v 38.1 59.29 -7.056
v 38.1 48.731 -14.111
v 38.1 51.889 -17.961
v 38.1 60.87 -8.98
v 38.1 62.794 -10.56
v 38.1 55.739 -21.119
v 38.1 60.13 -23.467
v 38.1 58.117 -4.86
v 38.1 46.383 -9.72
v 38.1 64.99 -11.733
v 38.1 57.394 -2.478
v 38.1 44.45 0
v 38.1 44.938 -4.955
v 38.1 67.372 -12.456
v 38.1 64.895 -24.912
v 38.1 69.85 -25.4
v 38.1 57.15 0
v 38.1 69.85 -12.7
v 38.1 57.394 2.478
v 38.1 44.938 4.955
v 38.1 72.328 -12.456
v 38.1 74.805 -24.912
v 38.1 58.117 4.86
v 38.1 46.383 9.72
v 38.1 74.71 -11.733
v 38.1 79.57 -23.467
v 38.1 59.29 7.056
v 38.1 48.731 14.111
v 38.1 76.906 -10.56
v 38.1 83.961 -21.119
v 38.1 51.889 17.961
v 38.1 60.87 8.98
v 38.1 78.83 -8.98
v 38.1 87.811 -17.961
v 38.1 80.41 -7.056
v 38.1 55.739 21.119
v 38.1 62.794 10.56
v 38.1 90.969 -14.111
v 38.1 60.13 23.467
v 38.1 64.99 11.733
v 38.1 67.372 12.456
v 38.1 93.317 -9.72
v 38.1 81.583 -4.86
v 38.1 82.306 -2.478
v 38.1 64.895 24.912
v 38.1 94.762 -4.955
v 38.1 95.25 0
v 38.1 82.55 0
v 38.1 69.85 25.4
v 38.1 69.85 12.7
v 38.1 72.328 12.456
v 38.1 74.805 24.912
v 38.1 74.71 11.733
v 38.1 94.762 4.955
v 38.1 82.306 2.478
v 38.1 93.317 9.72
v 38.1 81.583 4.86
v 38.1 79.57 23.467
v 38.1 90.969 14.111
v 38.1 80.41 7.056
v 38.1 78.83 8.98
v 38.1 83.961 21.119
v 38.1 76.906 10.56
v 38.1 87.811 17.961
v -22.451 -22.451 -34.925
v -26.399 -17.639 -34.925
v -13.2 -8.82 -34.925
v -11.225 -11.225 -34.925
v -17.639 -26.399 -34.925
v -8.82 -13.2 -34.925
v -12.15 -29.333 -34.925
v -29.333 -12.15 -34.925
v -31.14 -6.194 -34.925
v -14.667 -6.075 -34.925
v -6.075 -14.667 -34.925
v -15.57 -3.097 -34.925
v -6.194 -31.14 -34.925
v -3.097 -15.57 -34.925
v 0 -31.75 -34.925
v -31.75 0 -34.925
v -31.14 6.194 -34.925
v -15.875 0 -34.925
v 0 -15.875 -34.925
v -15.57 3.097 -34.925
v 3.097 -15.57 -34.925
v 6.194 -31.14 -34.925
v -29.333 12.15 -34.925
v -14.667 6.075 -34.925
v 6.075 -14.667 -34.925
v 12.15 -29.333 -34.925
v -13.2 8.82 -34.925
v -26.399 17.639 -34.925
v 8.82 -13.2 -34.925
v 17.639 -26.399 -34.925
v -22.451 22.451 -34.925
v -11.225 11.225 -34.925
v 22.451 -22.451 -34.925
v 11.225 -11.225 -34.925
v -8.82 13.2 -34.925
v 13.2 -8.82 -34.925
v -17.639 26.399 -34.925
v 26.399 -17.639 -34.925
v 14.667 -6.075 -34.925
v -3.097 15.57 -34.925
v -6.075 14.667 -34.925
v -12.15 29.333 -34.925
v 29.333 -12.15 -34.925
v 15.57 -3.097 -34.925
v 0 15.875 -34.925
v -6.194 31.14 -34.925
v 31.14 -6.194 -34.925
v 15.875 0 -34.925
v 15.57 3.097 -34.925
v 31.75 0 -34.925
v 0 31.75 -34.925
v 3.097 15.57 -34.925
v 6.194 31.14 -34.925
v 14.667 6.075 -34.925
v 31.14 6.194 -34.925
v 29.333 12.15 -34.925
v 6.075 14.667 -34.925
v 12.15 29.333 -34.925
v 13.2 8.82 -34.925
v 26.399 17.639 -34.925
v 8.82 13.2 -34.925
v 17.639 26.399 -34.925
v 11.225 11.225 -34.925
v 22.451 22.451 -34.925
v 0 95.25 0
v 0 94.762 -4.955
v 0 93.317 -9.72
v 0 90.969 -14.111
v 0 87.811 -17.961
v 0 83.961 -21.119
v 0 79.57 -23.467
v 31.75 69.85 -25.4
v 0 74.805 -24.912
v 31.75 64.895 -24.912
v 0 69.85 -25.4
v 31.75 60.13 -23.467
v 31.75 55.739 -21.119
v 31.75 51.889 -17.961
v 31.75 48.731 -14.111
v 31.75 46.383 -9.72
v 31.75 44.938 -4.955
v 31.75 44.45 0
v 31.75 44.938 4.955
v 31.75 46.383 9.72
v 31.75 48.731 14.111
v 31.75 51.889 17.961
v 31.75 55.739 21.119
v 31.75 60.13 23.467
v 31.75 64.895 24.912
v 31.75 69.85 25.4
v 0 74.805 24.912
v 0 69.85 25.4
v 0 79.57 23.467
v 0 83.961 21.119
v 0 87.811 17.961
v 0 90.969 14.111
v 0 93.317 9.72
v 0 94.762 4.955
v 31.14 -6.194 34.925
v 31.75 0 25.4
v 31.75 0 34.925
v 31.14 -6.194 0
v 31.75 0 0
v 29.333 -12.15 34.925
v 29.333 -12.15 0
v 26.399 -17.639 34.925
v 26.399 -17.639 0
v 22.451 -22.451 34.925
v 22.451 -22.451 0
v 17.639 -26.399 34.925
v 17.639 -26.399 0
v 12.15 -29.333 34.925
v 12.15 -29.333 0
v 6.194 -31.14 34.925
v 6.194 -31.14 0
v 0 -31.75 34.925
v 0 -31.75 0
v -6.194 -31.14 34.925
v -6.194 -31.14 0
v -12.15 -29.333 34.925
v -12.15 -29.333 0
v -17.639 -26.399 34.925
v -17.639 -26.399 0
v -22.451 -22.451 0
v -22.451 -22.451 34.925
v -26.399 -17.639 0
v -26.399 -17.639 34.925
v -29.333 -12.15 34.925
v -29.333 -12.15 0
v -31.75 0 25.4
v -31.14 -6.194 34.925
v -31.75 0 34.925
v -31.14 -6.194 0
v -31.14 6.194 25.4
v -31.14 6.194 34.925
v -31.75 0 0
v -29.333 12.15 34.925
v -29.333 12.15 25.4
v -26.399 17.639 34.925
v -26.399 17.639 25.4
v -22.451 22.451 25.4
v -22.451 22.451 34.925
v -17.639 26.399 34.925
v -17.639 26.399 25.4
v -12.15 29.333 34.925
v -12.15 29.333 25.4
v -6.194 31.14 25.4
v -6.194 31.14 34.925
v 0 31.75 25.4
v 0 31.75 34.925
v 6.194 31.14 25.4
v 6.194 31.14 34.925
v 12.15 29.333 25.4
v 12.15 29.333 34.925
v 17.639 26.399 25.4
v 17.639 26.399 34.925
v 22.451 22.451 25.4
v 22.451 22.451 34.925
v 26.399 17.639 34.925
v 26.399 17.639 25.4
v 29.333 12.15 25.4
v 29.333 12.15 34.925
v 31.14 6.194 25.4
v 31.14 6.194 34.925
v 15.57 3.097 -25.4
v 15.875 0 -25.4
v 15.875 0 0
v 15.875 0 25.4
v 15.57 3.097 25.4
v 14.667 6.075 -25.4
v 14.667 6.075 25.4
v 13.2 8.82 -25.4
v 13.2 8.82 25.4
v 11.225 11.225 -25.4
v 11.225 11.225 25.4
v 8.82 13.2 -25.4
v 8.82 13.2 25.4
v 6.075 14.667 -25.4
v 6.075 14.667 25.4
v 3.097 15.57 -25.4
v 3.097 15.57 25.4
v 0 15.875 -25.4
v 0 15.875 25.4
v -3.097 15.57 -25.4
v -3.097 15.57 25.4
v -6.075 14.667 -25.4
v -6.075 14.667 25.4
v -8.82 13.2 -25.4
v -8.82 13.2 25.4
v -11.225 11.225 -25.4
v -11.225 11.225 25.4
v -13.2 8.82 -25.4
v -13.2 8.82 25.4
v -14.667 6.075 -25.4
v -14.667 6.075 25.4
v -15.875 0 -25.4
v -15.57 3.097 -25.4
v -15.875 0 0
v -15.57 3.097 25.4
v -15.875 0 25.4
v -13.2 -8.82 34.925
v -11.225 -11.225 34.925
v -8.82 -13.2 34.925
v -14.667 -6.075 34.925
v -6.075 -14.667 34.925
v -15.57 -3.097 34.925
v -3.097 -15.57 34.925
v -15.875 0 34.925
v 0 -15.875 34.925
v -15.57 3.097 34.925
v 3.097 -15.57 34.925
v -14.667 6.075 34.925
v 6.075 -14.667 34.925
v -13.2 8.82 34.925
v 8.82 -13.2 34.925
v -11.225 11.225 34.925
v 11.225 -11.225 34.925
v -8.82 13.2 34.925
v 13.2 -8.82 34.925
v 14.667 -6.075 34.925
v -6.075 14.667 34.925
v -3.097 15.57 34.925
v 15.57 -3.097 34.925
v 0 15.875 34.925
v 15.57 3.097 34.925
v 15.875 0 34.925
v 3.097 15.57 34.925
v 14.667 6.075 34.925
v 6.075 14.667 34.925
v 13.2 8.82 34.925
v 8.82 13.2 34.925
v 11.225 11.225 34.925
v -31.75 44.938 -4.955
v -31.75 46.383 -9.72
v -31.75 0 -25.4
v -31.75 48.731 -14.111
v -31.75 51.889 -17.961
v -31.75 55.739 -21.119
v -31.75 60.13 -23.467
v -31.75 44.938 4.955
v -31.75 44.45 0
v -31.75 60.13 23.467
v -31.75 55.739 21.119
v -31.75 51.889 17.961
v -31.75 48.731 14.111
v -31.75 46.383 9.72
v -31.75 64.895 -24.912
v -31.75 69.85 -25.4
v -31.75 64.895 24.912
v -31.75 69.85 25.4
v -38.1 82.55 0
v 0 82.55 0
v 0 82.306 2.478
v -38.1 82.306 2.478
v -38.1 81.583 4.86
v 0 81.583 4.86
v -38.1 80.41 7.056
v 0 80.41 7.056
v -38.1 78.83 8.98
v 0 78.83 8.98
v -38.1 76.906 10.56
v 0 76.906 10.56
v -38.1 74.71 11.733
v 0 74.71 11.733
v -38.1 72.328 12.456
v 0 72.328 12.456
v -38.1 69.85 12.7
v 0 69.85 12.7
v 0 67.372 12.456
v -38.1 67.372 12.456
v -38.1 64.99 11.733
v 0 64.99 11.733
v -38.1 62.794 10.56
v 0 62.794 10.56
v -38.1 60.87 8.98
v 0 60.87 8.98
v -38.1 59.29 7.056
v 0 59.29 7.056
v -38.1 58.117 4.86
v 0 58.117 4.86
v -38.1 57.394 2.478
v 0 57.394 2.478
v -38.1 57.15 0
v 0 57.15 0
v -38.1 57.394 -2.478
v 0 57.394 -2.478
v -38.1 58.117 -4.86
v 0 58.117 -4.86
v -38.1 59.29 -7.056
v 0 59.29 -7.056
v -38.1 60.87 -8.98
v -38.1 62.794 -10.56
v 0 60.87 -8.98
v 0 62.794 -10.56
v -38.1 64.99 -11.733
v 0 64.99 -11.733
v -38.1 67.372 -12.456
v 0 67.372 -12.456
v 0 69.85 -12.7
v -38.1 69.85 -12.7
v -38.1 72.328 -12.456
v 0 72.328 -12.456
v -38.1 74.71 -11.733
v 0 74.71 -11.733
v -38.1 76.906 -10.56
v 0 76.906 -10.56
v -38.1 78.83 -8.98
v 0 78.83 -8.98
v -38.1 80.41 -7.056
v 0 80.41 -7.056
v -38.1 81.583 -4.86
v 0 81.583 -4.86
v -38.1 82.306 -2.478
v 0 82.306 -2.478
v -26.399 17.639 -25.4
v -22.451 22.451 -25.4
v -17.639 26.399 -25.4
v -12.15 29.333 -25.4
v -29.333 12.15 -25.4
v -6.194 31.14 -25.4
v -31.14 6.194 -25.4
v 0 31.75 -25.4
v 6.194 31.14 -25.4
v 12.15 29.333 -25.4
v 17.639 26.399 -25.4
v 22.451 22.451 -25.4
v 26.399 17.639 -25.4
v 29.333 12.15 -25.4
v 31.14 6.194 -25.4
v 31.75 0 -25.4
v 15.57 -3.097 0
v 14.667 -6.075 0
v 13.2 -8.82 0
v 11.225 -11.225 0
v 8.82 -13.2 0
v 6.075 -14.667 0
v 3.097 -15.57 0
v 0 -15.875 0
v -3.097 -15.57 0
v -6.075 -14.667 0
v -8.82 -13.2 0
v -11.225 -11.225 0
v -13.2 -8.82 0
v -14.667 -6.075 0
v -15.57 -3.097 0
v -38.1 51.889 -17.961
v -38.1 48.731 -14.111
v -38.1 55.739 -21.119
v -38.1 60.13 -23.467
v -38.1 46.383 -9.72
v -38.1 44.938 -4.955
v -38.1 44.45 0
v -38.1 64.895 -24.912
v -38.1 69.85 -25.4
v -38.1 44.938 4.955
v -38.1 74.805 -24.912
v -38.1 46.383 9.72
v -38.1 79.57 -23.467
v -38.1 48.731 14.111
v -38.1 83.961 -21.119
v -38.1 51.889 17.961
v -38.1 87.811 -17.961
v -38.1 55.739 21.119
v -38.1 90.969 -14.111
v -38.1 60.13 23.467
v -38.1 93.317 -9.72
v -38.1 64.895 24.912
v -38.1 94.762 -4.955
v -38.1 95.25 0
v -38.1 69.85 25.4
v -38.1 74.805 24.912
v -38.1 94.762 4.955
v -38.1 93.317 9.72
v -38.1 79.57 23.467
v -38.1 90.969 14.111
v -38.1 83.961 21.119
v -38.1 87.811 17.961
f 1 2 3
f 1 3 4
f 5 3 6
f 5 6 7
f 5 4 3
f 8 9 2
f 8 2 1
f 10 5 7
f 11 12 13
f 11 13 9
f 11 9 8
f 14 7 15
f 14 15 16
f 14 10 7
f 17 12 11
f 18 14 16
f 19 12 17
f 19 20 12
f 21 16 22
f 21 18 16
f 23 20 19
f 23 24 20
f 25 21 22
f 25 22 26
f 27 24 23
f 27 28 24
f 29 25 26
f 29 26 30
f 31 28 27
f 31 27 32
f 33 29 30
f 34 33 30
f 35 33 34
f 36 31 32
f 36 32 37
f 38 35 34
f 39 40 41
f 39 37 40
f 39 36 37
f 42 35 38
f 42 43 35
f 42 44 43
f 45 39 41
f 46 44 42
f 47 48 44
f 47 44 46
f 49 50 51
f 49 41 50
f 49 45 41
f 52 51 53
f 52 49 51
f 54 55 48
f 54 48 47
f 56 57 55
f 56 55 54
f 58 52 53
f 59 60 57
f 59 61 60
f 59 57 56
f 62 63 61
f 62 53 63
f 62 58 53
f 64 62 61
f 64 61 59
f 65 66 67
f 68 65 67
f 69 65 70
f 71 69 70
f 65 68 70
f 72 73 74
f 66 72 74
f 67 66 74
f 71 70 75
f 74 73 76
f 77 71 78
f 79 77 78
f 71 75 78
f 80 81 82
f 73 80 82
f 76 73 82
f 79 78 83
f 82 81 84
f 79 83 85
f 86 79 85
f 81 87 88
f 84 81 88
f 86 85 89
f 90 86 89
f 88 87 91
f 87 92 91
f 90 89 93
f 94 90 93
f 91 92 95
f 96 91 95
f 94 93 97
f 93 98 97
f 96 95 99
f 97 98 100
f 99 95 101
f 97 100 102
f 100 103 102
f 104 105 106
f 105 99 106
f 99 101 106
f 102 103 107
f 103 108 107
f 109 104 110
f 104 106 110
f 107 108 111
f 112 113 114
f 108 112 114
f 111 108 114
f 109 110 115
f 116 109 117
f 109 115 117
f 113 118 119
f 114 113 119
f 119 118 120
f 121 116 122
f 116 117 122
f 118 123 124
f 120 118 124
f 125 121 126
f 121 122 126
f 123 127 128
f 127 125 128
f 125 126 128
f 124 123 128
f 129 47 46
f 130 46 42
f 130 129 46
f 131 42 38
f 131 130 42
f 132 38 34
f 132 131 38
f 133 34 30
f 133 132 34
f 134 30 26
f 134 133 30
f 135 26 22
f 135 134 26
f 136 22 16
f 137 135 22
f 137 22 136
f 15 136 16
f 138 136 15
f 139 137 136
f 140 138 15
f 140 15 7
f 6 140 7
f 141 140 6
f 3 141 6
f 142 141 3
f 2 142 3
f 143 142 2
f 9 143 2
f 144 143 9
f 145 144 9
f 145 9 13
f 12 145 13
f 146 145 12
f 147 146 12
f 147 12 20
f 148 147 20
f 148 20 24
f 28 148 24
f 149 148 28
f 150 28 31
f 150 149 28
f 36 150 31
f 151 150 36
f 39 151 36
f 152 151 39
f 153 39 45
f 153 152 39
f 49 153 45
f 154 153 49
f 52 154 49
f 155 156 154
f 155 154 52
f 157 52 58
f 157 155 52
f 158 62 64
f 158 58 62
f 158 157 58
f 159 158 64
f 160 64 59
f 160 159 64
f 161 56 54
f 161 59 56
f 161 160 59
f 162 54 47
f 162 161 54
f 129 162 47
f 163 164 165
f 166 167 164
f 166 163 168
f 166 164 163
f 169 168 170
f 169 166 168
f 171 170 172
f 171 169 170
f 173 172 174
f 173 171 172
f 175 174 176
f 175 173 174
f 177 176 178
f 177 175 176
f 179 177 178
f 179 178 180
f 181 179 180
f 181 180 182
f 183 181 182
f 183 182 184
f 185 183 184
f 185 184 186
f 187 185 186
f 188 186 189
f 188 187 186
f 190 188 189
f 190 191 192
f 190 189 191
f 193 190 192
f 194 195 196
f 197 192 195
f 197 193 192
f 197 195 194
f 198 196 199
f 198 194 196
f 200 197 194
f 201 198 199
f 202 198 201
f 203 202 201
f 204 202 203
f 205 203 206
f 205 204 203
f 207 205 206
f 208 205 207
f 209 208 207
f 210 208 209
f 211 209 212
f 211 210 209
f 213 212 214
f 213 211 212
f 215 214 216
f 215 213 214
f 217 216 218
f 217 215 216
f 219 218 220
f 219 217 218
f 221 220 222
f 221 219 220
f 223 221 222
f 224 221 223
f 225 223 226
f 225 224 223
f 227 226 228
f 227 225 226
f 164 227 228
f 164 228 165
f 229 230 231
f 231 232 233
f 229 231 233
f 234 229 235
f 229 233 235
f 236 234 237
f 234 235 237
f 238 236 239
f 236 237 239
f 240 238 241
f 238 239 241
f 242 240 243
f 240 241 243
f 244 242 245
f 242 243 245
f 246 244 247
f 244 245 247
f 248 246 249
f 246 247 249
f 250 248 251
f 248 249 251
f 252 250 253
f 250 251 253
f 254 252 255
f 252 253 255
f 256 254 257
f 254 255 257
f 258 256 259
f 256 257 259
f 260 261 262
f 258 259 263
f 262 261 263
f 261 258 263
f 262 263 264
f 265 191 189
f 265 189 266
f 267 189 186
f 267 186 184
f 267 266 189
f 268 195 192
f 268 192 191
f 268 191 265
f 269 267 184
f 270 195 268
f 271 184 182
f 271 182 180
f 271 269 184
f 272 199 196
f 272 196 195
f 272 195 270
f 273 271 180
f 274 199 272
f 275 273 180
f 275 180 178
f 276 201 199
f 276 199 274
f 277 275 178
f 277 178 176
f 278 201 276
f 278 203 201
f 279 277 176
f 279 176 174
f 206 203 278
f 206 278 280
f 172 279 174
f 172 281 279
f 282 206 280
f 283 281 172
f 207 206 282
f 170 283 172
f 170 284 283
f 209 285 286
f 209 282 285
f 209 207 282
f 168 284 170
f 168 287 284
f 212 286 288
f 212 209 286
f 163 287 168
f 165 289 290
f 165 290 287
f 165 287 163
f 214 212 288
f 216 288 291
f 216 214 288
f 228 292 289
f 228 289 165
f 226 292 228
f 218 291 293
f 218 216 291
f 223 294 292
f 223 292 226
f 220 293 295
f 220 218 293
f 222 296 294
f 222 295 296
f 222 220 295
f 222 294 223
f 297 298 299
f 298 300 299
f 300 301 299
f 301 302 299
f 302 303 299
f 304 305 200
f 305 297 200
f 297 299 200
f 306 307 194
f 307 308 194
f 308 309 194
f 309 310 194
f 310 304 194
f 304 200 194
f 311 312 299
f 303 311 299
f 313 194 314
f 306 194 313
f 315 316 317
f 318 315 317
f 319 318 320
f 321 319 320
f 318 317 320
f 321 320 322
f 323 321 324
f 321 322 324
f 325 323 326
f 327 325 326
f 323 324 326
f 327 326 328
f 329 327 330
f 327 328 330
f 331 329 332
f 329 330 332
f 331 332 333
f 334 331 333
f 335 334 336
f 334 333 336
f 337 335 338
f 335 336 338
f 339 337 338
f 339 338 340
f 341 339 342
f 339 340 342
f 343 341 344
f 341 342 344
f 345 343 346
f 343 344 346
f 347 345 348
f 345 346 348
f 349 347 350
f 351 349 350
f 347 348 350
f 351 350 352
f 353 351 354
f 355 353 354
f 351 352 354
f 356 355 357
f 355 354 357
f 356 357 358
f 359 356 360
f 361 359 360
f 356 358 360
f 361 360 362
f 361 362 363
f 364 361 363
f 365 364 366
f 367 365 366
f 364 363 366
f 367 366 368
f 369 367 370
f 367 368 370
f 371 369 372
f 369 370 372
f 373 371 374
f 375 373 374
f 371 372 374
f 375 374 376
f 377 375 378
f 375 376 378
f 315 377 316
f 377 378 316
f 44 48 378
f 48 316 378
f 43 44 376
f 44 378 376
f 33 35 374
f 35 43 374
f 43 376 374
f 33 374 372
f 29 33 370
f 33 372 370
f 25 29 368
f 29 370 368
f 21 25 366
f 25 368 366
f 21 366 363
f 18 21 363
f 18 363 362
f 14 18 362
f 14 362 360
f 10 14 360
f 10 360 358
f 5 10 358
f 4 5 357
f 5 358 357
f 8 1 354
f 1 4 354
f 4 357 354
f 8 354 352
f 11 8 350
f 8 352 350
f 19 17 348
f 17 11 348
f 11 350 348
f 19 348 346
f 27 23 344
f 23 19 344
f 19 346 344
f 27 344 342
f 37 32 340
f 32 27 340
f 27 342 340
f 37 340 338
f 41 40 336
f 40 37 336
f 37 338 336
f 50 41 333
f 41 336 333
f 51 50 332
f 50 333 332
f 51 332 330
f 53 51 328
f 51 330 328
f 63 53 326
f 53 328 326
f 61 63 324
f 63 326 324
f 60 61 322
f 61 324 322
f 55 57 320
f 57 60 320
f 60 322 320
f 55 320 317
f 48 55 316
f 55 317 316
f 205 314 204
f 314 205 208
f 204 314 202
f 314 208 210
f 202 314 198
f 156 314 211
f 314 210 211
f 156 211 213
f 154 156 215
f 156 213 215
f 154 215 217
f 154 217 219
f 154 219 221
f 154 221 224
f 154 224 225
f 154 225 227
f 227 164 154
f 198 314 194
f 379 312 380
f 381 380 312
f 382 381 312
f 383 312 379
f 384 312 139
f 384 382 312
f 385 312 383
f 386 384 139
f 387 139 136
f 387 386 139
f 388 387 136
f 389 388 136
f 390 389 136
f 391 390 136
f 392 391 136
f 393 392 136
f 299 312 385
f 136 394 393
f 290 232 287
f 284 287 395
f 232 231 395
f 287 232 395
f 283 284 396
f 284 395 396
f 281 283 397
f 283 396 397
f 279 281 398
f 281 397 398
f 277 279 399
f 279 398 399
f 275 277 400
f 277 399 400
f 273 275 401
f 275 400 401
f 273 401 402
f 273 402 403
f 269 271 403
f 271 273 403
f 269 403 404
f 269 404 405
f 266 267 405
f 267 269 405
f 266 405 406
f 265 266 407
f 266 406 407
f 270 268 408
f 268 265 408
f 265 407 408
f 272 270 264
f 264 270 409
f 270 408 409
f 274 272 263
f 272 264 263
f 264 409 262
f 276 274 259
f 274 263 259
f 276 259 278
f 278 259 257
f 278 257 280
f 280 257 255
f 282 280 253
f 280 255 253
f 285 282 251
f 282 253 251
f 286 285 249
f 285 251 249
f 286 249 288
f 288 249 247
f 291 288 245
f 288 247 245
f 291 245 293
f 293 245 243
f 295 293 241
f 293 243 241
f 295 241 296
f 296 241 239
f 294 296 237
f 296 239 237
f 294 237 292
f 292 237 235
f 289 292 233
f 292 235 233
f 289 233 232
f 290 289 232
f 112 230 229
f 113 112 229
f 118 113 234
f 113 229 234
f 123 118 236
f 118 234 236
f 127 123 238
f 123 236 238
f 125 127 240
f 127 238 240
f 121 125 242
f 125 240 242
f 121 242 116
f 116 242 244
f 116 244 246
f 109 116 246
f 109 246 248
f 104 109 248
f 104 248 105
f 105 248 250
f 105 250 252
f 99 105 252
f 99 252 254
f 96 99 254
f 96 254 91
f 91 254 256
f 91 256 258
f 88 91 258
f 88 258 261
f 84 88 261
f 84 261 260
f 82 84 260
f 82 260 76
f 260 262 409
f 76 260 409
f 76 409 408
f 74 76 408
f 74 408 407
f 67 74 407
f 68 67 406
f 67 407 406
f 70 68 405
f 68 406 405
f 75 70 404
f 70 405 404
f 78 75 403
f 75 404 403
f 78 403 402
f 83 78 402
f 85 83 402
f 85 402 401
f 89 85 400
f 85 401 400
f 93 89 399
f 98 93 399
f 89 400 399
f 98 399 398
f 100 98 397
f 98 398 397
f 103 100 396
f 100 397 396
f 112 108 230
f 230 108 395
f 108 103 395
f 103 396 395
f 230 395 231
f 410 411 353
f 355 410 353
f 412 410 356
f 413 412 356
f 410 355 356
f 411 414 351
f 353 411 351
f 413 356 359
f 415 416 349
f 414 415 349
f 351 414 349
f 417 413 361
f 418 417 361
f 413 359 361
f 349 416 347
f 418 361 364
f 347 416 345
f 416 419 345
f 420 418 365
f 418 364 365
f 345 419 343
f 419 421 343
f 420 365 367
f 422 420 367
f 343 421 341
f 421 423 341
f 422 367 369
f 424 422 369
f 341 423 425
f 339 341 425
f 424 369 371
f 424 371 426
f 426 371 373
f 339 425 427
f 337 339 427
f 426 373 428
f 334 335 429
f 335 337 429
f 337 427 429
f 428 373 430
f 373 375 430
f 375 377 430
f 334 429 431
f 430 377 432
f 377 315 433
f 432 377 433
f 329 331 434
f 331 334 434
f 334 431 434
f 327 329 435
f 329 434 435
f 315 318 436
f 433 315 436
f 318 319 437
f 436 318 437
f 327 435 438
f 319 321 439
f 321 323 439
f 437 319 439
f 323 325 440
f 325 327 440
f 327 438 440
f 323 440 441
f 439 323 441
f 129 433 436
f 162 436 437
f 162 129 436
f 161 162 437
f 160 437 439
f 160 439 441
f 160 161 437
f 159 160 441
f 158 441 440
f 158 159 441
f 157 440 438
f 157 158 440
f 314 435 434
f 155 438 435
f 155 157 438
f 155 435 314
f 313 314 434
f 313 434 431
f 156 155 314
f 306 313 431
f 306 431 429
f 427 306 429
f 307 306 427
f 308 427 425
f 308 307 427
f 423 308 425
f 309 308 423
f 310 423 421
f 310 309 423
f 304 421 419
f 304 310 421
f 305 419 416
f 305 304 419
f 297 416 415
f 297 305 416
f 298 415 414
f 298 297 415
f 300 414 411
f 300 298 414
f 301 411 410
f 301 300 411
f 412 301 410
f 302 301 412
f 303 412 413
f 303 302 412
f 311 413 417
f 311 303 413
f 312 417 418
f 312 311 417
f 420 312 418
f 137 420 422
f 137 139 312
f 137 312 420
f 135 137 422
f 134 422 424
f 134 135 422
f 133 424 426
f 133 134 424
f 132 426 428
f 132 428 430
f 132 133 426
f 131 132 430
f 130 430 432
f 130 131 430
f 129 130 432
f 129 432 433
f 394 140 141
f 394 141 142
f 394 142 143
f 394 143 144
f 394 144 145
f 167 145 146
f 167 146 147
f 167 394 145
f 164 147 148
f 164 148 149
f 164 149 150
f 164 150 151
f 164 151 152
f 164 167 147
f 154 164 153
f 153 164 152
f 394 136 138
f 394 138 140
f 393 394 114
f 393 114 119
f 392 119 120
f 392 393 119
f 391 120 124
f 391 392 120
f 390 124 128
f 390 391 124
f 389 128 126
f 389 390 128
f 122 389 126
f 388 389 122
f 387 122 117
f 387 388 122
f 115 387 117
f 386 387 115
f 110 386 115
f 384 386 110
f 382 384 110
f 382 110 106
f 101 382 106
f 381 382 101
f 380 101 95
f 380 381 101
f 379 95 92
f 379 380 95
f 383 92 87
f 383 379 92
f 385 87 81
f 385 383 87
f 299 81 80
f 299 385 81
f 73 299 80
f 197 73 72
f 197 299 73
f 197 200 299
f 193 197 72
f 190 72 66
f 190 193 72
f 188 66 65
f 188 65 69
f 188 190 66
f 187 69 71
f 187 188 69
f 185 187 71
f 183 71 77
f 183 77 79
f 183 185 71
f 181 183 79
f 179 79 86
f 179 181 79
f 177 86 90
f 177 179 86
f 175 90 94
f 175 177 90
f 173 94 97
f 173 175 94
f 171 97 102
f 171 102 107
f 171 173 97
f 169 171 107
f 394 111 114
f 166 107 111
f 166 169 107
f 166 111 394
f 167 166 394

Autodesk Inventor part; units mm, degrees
ref_plane "YZ Plane" through (0, 0, 0) normal (1, 0, 0) x (0, 1, 0)
ref_plane "XZ Plane" through (0, 0, 0) normal (0, 1, 0) x (-1, 0, 0)
ref_plane "XY Plane" through (0, 0, 0) normal (0, 0, 1) x (1, 0, 0)
sketch "Sketch1" plane through (0, 0, 0) normal (0, 0, 1) x (1, 0, 0)
  circle A0 centre (0, 0) radius 31.75
  circle A1 centre (0, 0) radius 15.875
  dimension "d0" = 63.5
  dimension "d1" = 31.75
extrude "Extrusion1" add sketch "Sketch1" along normal mid plane 69.85
sketch "Sketch2" plane through (0, 0, 0) normal (1, 0, 0) x (0, 1, 0)
  line L0 (0, 0) -> (69.85, 0) construction
  circle A0 centre (69.85, 0) radius 25.4
  circle A1 centre (69.85, 0) radius 12.7
  dimension "d4" = 69.85
  dimension "d5" = 50.8
  dimension "d6" = 25.4
extrude "Extrusion2" add sketch "Sketch2" along normal mid plane 76.2
sketch "Sketch3" plane through (0, 0, 0) normal (0, 1, 0) x (-1, 0, 0)
  line L0 (-31.75, -34.925) -> (31.75, -34.925) projected
  line L1 (31.75, 34.925) -> (-31.75, 34.925) projected
  line L2 (-31.75, -34.925) -> (-31.75, 34.925) projected
  line L3 (31.75, -34.925) -> (31.75, 34.925) projected
  line L4 (38.1, -25.4) -> (38.1, 25.4) projected
  line L5 (-38.1, 25.4) -> (-38.1, -25.4) projected
  line L6 (38.1, 25.4) -> (-38.1, 25.4) projected
  line L7 (38.1, -25.4) -> (-38.1, -25.4) projected
  line L8 (31.75, 25.4) -> (-31.75, 25.4)
  line L9 (-31.75, -25.4) -> (-31.75, 25.4)
  line L10 (-31.75, -25.4) -> (31.75, -25.4)
  line L11 (31.75, 25.4) -> (31.75, -25.4)
  point P0 (0, 0)
extrude "Extrusion3" add sketch "Sketch3" along normal up to surface contours L2 L6 L3 L7
sketch "Sketch4" plane through (0, 0, 34.925) normal (0, 0, 1) x (1, 0, 0)
  circle A0 centre (0, 0) radius 15.875
extrude "Extrusion4" cut sketch "Sketch4" against normal through all
properties part number "TubeSpacer"
